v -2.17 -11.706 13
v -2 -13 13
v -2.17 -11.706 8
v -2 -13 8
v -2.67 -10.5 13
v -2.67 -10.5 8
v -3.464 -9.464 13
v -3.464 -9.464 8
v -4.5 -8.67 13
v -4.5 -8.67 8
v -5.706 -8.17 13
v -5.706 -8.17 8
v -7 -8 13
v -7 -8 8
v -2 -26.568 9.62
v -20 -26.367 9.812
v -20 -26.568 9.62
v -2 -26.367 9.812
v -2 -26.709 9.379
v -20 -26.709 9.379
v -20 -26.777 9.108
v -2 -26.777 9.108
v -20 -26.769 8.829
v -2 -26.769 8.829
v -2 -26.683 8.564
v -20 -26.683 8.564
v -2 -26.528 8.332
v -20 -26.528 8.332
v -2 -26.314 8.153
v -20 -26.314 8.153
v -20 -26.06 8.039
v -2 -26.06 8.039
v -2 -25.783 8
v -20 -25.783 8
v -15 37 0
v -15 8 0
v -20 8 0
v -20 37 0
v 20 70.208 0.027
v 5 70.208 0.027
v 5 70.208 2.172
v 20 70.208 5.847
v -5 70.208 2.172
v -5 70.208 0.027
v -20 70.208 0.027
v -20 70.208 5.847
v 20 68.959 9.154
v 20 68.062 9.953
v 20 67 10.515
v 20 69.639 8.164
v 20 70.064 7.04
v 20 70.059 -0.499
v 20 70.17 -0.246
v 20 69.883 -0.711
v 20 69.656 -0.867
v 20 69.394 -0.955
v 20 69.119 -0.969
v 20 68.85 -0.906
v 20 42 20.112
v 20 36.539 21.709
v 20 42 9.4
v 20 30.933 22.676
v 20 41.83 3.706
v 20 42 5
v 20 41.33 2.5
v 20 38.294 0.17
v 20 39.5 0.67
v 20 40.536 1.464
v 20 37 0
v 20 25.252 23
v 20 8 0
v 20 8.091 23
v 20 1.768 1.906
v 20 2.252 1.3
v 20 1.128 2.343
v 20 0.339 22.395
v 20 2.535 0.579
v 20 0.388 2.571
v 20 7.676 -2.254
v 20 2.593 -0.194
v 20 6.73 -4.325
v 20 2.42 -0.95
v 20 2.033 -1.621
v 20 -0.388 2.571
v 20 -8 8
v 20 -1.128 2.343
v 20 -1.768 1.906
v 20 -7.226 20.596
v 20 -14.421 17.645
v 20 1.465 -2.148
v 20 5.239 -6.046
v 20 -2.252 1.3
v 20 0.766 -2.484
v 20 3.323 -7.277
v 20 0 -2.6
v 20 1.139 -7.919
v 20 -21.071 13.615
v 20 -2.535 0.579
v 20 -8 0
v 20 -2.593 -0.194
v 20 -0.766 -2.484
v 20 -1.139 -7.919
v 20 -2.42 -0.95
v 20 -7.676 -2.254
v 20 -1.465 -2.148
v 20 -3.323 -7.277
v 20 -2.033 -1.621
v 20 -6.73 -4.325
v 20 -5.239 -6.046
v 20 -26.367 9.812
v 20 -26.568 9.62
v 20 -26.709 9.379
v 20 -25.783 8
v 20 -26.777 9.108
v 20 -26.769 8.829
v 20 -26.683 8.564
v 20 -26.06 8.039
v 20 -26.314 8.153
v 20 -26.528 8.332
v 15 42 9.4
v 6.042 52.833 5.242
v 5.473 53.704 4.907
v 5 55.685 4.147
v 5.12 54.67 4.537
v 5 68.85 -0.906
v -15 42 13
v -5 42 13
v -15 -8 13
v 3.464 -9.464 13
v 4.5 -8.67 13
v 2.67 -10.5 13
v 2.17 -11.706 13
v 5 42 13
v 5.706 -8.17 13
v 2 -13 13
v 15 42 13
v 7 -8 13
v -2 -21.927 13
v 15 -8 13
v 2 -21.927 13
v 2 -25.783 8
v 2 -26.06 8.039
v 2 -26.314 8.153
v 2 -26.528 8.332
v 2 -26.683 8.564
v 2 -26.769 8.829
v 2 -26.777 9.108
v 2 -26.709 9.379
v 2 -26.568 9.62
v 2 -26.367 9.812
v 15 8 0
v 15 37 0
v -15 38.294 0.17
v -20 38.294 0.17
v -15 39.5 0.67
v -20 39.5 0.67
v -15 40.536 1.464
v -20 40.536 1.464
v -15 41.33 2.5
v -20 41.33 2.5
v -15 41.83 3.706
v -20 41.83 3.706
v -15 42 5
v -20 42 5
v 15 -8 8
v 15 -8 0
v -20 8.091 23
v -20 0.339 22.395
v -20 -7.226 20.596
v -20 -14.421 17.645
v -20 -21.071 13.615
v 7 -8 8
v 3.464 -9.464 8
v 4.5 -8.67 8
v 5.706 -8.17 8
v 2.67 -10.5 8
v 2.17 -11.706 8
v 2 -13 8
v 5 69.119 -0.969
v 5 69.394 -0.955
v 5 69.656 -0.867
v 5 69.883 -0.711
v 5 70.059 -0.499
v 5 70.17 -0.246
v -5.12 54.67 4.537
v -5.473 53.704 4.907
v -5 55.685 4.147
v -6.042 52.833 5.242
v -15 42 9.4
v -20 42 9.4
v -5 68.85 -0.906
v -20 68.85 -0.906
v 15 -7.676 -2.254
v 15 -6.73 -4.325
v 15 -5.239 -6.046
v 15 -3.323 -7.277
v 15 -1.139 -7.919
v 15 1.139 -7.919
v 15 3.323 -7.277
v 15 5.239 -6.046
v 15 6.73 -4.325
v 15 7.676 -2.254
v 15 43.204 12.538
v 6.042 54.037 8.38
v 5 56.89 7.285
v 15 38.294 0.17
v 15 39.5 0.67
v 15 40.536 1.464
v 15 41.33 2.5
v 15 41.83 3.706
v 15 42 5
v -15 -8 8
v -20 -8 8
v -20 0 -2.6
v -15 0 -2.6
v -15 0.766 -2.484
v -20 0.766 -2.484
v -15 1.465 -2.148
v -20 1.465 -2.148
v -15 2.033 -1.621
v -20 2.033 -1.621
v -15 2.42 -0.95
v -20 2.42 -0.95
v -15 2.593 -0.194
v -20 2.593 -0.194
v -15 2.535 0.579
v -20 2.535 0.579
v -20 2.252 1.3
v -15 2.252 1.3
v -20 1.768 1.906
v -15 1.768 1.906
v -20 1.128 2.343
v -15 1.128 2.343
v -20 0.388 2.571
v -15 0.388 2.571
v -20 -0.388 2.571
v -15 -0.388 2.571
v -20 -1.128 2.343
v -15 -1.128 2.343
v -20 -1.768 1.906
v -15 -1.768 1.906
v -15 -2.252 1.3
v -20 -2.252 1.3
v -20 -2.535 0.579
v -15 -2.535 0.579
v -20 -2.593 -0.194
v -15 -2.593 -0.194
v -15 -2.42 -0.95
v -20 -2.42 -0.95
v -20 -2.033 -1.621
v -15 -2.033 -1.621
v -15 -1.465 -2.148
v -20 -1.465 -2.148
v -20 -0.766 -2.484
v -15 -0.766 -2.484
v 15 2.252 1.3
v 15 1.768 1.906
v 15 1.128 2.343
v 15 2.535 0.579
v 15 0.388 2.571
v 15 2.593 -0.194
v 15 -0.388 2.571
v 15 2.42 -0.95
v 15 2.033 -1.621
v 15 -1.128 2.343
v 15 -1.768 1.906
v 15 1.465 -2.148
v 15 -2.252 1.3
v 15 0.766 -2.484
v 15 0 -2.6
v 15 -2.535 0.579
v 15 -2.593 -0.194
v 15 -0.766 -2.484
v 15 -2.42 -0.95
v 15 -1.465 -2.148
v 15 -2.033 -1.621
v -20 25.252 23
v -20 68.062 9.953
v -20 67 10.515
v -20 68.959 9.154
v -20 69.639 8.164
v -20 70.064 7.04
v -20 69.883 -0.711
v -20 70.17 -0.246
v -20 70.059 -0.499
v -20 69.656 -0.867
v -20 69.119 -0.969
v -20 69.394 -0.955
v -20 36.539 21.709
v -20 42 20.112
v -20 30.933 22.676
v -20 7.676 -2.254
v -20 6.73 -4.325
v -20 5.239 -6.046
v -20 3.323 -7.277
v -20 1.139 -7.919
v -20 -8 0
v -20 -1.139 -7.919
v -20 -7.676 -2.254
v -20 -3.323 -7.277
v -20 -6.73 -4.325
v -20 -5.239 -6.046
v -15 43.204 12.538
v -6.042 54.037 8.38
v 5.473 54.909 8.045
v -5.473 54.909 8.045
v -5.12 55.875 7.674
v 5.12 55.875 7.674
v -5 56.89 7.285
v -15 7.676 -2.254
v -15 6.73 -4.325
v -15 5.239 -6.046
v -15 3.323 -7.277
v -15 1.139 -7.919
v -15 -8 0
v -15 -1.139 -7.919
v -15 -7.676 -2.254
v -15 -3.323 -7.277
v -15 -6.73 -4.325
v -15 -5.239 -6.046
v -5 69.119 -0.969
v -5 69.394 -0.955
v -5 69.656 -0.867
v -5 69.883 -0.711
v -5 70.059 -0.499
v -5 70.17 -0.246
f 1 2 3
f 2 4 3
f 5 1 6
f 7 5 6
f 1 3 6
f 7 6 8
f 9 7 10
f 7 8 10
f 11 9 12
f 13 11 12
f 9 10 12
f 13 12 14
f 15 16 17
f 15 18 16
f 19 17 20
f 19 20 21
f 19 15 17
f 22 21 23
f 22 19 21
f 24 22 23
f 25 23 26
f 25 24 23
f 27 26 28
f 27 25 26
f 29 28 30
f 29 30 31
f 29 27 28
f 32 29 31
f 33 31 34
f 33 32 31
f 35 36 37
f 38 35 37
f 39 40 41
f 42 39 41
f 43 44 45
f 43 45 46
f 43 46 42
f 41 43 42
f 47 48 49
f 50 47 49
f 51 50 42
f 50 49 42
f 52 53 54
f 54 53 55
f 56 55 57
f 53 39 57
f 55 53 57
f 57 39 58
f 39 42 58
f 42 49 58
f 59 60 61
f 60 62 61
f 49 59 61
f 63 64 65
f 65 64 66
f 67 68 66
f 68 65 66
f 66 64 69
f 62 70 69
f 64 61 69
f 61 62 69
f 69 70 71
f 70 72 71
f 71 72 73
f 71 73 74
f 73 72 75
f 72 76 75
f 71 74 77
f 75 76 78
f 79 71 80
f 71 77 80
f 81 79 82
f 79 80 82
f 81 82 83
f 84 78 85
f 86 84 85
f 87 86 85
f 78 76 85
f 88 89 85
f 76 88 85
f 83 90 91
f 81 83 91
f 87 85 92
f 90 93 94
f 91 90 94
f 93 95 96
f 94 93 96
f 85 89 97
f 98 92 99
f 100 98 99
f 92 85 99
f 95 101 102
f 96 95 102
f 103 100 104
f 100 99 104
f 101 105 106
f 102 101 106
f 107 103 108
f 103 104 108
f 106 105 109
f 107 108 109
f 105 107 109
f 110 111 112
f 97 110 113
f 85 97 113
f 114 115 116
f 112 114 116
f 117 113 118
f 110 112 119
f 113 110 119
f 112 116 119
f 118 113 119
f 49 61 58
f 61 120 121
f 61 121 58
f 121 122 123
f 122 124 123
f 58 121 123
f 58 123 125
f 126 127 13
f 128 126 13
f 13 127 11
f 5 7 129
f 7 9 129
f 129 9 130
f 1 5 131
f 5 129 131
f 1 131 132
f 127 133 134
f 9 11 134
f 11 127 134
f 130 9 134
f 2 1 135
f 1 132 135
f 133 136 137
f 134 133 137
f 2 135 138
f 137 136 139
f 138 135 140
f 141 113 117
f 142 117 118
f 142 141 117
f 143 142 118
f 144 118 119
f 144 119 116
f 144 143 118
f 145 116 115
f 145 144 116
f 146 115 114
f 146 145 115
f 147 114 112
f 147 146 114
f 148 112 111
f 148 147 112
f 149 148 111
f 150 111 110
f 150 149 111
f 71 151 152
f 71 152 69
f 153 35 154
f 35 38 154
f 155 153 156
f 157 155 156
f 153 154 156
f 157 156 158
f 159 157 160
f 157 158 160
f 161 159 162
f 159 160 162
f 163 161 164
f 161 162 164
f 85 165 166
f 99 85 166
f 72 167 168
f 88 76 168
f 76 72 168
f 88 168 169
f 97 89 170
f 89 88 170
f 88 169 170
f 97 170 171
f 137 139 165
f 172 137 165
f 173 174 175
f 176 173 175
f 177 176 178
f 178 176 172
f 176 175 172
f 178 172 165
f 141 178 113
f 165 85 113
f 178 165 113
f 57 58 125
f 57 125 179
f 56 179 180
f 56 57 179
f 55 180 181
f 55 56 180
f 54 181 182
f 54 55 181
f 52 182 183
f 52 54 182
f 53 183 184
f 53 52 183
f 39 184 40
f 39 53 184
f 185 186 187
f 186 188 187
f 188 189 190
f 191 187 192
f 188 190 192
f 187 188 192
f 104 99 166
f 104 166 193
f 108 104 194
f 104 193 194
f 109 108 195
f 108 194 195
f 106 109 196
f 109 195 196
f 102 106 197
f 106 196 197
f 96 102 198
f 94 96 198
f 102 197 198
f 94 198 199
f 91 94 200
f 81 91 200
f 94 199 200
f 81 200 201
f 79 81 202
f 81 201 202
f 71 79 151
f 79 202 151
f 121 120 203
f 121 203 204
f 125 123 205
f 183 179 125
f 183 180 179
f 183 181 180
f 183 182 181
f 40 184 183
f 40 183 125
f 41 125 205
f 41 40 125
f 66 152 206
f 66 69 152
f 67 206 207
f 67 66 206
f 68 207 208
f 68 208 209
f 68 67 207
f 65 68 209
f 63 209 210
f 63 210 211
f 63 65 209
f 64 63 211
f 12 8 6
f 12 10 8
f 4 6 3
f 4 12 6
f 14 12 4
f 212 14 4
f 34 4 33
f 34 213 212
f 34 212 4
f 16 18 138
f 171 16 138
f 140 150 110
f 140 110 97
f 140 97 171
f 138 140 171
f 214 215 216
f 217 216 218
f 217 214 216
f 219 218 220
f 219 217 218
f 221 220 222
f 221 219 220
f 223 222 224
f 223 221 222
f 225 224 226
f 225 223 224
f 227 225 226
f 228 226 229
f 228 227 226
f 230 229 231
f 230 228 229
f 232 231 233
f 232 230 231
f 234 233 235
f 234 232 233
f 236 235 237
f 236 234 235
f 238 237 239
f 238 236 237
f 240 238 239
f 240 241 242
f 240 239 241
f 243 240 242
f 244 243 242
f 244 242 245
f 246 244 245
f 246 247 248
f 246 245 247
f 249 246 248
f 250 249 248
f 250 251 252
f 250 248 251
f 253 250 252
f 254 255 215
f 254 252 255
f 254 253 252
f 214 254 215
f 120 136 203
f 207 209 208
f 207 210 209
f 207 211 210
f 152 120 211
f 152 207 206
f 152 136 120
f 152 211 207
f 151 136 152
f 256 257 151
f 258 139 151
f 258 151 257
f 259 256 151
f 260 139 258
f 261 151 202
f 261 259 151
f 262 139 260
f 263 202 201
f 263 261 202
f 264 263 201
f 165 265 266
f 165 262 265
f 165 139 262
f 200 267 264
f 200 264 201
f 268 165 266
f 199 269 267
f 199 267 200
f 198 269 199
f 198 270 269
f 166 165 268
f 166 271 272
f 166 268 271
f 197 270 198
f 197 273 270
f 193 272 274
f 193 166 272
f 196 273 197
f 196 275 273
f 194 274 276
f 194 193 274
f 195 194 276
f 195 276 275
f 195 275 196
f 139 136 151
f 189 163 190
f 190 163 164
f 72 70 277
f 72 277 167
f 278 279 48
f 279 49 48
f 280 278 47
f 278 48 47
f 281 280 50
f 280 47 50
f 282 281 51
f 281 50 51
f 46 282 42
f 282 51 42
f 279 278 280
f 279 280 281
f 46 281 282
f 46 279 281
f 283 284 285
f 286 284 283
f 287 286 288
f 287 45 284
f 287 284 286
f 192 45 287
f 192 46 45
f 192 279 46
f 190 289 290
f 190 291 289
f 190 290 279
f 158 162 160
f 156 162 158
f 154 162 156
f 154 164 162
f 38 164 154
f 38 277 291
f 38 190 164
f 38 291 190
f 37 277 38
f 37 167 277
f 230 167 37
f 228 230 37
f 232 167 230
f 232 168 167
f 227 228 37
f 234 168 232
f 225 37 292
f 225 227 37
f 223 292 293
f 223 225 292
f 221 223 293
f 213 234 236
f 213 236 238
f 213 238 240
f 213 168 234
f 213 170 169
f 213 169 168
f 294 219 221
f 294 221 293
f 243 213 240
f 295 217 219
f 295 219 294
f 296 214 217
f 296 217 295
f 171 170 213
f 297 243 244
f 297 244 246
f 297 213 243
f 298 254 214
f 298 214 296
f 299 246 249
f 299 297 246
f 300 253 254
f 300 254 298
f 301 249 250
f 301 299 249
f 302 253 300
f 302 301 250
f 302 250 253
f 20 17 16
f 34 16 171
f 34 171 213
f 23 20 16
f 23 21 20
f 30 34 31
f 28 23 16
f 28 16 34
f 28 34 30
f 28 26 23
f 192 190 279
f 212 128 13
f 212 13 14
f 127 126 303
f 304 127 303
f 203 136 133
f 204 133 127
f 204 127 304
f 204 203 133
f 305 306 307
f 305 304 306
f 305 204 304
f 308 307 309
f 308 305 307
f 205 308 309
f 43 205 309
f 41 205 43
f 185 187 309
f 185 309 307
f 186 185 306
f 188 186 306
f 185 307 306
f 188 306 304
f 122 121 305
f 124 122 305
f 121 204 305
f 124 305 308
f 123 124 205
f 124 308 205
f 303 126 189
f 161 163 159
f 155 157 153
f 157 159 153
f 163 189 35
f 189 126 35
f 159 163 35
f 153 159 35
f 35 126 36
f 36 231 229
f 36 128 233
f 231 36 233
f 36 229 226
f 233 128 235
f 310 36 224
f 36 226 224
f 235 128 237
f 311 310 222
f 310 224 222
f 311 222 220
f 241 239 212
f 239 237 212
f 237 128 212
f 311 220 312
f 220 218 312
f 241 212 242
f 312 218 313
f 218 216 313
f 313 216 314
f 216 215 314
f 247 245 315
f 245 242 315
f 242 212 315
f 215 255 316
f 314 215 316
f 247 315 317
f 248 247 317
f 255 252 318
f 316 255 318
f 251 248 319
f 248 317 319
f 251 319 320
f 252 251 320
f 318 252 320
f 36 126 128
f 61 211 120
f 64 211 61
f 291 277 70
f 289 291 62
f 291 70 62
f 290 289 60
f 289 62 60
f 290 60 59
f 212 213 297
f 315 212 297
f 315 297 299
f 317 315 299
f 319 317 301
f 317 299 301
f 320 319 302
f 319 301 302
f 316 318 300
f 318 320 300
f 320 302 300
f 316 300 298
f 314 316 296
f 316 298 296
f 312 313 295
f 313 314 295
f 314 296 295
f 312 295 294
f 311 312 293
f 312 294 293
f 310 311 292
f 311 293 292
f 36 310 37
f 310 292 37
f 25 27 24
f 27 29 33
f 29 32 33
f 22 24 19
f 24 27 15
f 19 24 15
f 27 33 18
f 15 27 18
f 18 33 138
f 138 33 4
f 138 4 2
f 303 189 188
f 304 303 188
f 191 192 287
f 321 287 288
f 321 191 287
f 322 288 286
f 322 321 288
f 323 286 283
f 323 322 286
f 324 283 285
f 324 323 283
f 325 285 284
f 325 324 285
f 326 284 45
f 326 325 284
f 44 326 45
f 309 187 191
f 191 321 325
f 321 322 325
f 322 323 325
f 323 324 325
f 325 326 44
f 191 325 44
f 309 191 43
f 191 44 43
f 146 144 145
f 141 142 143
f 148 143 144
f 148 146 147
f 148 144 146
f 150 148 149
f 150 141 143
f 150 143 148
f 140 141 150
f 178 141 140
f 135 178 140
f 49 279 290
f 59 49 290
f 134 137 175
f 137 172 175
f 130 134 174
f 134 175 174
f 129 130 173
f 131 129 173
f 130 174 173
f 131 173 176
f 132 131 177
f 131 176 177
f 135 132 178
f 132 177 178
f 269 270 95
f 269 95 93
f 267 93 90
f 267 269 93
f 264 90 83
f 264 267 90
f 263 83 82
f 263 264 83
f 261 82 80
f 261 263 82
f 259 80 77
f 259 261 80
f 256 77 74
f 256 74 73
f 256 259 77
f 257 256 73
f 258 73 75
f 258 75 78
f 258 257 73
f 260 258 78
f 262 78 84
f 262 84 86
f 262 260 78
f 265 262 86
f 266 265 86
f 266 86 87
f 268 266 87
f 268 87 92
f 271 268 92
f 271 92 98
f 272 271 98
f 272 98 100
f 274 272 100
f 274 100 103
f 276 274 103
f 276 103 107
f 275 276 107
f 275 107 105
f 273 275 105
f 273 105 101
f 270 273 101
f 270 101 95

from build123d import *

# Parameters (mm, degrees)
BOSS_EXTRUDE5_DEPTH      = 20
BOSS_EXTRUDE5_DEPTH_BACK = 20
SKETCH6_R                = 2.6000000000000005
SKETCH7_W                = 30.000000000000004
SKETCH7_H                = 21
CUT_EXTRUDE1_DEPTH       = 16
BOSS_EXTRUDE6_DEPTH      = 18
BOSS_EXTRUDE7_DEPTH      = 4
SKETCH12_W               = 4.9999999999999964
SKETCH12_H               = 12.999999999999998
BOSS_EXTRUDE8_DEPTH      = 34
FILLET4_R                = 5
FILLET5_R                = 1
CUT_EXTRUDE3_START       = -15
CUT_EXTRUDE3_DEPTH       = 10
CUT_EXTRUDE4_DEPTH       = 3.360889535
FILLET7_R                = 5
FILLET8_R                = 50


with BuildPart() as part:
    # Sketch6 → Boss-Extrude5 (new, two sides: drawn at the far end of the back side and taken through both)
    with BuildSketch(Plane(origin=(0, 0, 0), x_dir=(0, 0, -1), z_dir=(1, 0, 0)).offset(-BOSS_EXTRUDE5_DEPTH_BACK)):
        with BuildLine():
            Line((-23, -8), (0, -8))
            ThreePointArc((0, -8), (8, 0), (0, 8))
            Line((0, 8), (-13, 7.999999999999998))
            Line((-13, 7.999999999999998), (-13, 42))
            Line((-13, 42), (-9.400224659785392, 42))
            Line((-9.400224659785392, 42), (1.4279133192728315, 70.2082638402405))
            Line((1.4279133192728315, 70.2082638402405), (-9.283536617097441, 70.2082638402405))
            Line((-9.283536617097441, 70.2082638402405), (-20.111674596155662, 42))
            Line((-20.111674596155662, 42), (-23, 42))
            Line((-23, 42), (-23, -8))
        make_face()
        Circle(SKETCH6_R, mode=Mode.SUBTRACT)
    extrude(amount=BOSS_EXTRUDE5_DEPTH + BOSS_EXTRUDE5_DEPTH_BACK)

    # Sketch7 → Cut-Extrude1 (cut)
    with BuildSketch(Plane(origin=(0, 8, 1.07e-15), x_dir=(1, 0, 0), z_dir=(0, 1, 0))):
        with Locations((0, -2.4999999999999982)):
            Rectangle(SKETCH7_W, SKETCH7_H)
    extrude(amount=-CUT_EXTRUDE1_DEPTH, mode=Mode.SUBTRACT)

    # Sketch9 → Boss-Extrude6 (add)
    with BuildSketch(Plane(origin=(20, 0, 0), x_dir=(0, 0, -1), z_dir=(1, 0, 0))):
        Polygon((-8, -8), (-7.9999999999999964, -28.890618944469697), (-23, -8), align=None)
    boss_extrude6 = extrude(amount=-BOSS_EXTRUDE6_DEPTH)

    # Mirror1: Boss-Extrude6 across plane
    add(boss_extrude6.mirror(Plane(origin=(0, 0, 0), x_dir=(0, 0, 1), z_dir=(1, 0, 0))))

    # Sketch10 → Boss-Extrude7 (add)
    with BuildSketch(Plane.ZY.offset(-2)):
        Polygon((23, -8), (13, -8), (13.000000000000004, -21.927079296313124), align=None)
    extrude(amount=BOSS_EXTRUDE7_DEPTH)

    # Sketch12 → Boss-Extrude8 (add)
    with BuildSketch(Plane(origin=(0, 8, 1.07e-15), x_dir=(1, 0, 0), z_dir=(0, 1, 1.3e-16))):
        with Locations((17.5, -6.499999999999999)):
            Rectangle(SKETCH12_W, SKETCH12_H)
    boss_extrude8 = extrude(amount=BOSS_EXTRUDE8_DEPTH)

    # Mirror2: Boss-Extrude8 across plane
    add(boss_extrude8.mirror(Plane(origin=(0, 0, 0), x_dir=(0, 0, 1), z_dir=(1, 0, 0))))

    # Fillet4
    fillet4_edges = [part.edges().sort_by_distance(p)[0] for p in [
        (2, -8, 10.5),
        (-2, -8, 10.5),
    ]]
    fillet(fillet4_edges, radius=FILLET4_R)

    # Fillet5
    fillet5_edges = [part.edges().sort_by_distance(p)[0] for p in [
        (0, 70.2082638402405, -1.4279133192728315),
        (11, -28.890618944469697, 7.9999999999999964),
        (-11, -28.890618944469697, 7.9999999999999964),
    ]]
    fillet(fillet5_edges, radius=FILLET5_R)

    # Sketch13 → Cut-Extrude3 (cut)
    with BuildSketch(Plane(origin=(20, 0, 0), x_dir=(0, 0, -1), z_dir=(1, 0, 0)).offset(CUT_EXTRUDE3_START)):
        Polygon((1.4279133192728315, 70.2082638402405), (-9.400224659785392, 42), (-13.00022465978539, 42), (-2.172086680727171, 70.2082638402405), align=None)
    extrude(amount=-CUT_EXTRUDE3_DEPTH, mode=Mode.SUBTRACT)

    # Sketch14 → Cut-Extrude4 (cut)
    with BuildSketch(Plane(origin=(0, 8.538947678230453, 22.2447192205509), x_dir=(-1, 0, 0), z_dir=(0, -0.3583679495452972, -0.9335804264972031))):
        Polygon((-15.000000000000004, 35.8416386762901), (-5.000000000000001, 48.794944027775955), (-5.000000000000001, 35.8416386762901), (-5.000000000000001, 34.55159456879367), (-15.000000000000004, 34.55159456879367), align=None)
    cut_extrude4 = extrude(amount=-CUT_EXTRUDE4_DEPTH, mode=Mode.SUBTRACT)

    # Mirror3: Cut-Extrude4 across plane
    add(cut_extrude4.mirror(Plane(origin=(0, 0, 0), x_dir=(0, 0, 1), z_dir=(1, 0, 0))), mode=Mode.SUBTRACT)

    # Fillet7
    fillet7_edges = [part.edges().sort_by_distance(p)[0] for p in [
        (17.5, 42, 5.6e-15),
        (-17.5, 42, 5.6e-15),
        (0, 70.2082638402405, 9.283536617097441),
        (5.000000000000001, 54.695169880241785, 6.3270055238869265),
        (-5.000000000000001, 54.695169880241785, 6.3270055238869265),
    ]]
    fillet(fillet7_edges, radius=FILLET7_R)

    # Fillet8
    # the kernel refuses this fillet: 50 mm, written as the material it takes off along each edge
    with BuildSketch(Plane(origin=(61.869597916190855, 42, 23), x_dir=(0, 0, -1), z_dir=(-1, 0, 0))) as fillet8_piece_1:
        with BuildLine():
            CenterArc((50, 16.747839166469827), FILLET8_R, 180, 19.569909983271373)
            Line((0, 16.747839166469827), (-1, 16.747839166469827))
            Line((-1, 16.747839166469827), (-1, 0))
            Line((-1, 0), (0, -1))
            ThreePointArc((0, -1), (1.444162701922167, -1), (1.946091911921222, -0.33495678332939605))
            Line((1.946091911921222, -0.33495678332939605), (2.888325403844334, 0))
        make_face()
    extrude(amount=123.73919583238171, mode=Mode.SUBTRACT)
    with BuildSketch(Plane(origin=(-60.228570108654466, -8.000000000000004, 23), x_dir=(0, -0.812294131590468, -0.5832480122415225), z_dir=(1, 0, 0))) as fillet8_piece_2:
        with BuildLine():
            CenterArc((FILLET8_R * 0.321828560869, FILLET8_R), FILLET8_R, 234.32068370191269, 35.67931629808726)
            Line((-FILLET8_R * 0.261419451372, FILLET8_R * 0.18770586841), (-FILLET8_R * 0.273084411617, FILLET8_R * 0.171459985778))
            Line((-FILLET8_R * 0.273084411617, FILLET8_R * 0.171459985778), (-FILLET8_R * 0.00643657121738, -FILLET8_R * 0.02))
            Line((-FILLET8_R * 0.00643657121738, -FILLET8_R * 0.02), (FILLET8_R * 0.321828560869, -FILLET8_R * 0.02))
            Line((FILLET8_R * 0.321828560869, -FILLET8_R * 0.02), (FILLET8_R * 0.321828560869, 5e-16))
        make_face()
    extrude(amount=120.45714021730896, mode=Mode.SUBTRACT)


solid = part.part
